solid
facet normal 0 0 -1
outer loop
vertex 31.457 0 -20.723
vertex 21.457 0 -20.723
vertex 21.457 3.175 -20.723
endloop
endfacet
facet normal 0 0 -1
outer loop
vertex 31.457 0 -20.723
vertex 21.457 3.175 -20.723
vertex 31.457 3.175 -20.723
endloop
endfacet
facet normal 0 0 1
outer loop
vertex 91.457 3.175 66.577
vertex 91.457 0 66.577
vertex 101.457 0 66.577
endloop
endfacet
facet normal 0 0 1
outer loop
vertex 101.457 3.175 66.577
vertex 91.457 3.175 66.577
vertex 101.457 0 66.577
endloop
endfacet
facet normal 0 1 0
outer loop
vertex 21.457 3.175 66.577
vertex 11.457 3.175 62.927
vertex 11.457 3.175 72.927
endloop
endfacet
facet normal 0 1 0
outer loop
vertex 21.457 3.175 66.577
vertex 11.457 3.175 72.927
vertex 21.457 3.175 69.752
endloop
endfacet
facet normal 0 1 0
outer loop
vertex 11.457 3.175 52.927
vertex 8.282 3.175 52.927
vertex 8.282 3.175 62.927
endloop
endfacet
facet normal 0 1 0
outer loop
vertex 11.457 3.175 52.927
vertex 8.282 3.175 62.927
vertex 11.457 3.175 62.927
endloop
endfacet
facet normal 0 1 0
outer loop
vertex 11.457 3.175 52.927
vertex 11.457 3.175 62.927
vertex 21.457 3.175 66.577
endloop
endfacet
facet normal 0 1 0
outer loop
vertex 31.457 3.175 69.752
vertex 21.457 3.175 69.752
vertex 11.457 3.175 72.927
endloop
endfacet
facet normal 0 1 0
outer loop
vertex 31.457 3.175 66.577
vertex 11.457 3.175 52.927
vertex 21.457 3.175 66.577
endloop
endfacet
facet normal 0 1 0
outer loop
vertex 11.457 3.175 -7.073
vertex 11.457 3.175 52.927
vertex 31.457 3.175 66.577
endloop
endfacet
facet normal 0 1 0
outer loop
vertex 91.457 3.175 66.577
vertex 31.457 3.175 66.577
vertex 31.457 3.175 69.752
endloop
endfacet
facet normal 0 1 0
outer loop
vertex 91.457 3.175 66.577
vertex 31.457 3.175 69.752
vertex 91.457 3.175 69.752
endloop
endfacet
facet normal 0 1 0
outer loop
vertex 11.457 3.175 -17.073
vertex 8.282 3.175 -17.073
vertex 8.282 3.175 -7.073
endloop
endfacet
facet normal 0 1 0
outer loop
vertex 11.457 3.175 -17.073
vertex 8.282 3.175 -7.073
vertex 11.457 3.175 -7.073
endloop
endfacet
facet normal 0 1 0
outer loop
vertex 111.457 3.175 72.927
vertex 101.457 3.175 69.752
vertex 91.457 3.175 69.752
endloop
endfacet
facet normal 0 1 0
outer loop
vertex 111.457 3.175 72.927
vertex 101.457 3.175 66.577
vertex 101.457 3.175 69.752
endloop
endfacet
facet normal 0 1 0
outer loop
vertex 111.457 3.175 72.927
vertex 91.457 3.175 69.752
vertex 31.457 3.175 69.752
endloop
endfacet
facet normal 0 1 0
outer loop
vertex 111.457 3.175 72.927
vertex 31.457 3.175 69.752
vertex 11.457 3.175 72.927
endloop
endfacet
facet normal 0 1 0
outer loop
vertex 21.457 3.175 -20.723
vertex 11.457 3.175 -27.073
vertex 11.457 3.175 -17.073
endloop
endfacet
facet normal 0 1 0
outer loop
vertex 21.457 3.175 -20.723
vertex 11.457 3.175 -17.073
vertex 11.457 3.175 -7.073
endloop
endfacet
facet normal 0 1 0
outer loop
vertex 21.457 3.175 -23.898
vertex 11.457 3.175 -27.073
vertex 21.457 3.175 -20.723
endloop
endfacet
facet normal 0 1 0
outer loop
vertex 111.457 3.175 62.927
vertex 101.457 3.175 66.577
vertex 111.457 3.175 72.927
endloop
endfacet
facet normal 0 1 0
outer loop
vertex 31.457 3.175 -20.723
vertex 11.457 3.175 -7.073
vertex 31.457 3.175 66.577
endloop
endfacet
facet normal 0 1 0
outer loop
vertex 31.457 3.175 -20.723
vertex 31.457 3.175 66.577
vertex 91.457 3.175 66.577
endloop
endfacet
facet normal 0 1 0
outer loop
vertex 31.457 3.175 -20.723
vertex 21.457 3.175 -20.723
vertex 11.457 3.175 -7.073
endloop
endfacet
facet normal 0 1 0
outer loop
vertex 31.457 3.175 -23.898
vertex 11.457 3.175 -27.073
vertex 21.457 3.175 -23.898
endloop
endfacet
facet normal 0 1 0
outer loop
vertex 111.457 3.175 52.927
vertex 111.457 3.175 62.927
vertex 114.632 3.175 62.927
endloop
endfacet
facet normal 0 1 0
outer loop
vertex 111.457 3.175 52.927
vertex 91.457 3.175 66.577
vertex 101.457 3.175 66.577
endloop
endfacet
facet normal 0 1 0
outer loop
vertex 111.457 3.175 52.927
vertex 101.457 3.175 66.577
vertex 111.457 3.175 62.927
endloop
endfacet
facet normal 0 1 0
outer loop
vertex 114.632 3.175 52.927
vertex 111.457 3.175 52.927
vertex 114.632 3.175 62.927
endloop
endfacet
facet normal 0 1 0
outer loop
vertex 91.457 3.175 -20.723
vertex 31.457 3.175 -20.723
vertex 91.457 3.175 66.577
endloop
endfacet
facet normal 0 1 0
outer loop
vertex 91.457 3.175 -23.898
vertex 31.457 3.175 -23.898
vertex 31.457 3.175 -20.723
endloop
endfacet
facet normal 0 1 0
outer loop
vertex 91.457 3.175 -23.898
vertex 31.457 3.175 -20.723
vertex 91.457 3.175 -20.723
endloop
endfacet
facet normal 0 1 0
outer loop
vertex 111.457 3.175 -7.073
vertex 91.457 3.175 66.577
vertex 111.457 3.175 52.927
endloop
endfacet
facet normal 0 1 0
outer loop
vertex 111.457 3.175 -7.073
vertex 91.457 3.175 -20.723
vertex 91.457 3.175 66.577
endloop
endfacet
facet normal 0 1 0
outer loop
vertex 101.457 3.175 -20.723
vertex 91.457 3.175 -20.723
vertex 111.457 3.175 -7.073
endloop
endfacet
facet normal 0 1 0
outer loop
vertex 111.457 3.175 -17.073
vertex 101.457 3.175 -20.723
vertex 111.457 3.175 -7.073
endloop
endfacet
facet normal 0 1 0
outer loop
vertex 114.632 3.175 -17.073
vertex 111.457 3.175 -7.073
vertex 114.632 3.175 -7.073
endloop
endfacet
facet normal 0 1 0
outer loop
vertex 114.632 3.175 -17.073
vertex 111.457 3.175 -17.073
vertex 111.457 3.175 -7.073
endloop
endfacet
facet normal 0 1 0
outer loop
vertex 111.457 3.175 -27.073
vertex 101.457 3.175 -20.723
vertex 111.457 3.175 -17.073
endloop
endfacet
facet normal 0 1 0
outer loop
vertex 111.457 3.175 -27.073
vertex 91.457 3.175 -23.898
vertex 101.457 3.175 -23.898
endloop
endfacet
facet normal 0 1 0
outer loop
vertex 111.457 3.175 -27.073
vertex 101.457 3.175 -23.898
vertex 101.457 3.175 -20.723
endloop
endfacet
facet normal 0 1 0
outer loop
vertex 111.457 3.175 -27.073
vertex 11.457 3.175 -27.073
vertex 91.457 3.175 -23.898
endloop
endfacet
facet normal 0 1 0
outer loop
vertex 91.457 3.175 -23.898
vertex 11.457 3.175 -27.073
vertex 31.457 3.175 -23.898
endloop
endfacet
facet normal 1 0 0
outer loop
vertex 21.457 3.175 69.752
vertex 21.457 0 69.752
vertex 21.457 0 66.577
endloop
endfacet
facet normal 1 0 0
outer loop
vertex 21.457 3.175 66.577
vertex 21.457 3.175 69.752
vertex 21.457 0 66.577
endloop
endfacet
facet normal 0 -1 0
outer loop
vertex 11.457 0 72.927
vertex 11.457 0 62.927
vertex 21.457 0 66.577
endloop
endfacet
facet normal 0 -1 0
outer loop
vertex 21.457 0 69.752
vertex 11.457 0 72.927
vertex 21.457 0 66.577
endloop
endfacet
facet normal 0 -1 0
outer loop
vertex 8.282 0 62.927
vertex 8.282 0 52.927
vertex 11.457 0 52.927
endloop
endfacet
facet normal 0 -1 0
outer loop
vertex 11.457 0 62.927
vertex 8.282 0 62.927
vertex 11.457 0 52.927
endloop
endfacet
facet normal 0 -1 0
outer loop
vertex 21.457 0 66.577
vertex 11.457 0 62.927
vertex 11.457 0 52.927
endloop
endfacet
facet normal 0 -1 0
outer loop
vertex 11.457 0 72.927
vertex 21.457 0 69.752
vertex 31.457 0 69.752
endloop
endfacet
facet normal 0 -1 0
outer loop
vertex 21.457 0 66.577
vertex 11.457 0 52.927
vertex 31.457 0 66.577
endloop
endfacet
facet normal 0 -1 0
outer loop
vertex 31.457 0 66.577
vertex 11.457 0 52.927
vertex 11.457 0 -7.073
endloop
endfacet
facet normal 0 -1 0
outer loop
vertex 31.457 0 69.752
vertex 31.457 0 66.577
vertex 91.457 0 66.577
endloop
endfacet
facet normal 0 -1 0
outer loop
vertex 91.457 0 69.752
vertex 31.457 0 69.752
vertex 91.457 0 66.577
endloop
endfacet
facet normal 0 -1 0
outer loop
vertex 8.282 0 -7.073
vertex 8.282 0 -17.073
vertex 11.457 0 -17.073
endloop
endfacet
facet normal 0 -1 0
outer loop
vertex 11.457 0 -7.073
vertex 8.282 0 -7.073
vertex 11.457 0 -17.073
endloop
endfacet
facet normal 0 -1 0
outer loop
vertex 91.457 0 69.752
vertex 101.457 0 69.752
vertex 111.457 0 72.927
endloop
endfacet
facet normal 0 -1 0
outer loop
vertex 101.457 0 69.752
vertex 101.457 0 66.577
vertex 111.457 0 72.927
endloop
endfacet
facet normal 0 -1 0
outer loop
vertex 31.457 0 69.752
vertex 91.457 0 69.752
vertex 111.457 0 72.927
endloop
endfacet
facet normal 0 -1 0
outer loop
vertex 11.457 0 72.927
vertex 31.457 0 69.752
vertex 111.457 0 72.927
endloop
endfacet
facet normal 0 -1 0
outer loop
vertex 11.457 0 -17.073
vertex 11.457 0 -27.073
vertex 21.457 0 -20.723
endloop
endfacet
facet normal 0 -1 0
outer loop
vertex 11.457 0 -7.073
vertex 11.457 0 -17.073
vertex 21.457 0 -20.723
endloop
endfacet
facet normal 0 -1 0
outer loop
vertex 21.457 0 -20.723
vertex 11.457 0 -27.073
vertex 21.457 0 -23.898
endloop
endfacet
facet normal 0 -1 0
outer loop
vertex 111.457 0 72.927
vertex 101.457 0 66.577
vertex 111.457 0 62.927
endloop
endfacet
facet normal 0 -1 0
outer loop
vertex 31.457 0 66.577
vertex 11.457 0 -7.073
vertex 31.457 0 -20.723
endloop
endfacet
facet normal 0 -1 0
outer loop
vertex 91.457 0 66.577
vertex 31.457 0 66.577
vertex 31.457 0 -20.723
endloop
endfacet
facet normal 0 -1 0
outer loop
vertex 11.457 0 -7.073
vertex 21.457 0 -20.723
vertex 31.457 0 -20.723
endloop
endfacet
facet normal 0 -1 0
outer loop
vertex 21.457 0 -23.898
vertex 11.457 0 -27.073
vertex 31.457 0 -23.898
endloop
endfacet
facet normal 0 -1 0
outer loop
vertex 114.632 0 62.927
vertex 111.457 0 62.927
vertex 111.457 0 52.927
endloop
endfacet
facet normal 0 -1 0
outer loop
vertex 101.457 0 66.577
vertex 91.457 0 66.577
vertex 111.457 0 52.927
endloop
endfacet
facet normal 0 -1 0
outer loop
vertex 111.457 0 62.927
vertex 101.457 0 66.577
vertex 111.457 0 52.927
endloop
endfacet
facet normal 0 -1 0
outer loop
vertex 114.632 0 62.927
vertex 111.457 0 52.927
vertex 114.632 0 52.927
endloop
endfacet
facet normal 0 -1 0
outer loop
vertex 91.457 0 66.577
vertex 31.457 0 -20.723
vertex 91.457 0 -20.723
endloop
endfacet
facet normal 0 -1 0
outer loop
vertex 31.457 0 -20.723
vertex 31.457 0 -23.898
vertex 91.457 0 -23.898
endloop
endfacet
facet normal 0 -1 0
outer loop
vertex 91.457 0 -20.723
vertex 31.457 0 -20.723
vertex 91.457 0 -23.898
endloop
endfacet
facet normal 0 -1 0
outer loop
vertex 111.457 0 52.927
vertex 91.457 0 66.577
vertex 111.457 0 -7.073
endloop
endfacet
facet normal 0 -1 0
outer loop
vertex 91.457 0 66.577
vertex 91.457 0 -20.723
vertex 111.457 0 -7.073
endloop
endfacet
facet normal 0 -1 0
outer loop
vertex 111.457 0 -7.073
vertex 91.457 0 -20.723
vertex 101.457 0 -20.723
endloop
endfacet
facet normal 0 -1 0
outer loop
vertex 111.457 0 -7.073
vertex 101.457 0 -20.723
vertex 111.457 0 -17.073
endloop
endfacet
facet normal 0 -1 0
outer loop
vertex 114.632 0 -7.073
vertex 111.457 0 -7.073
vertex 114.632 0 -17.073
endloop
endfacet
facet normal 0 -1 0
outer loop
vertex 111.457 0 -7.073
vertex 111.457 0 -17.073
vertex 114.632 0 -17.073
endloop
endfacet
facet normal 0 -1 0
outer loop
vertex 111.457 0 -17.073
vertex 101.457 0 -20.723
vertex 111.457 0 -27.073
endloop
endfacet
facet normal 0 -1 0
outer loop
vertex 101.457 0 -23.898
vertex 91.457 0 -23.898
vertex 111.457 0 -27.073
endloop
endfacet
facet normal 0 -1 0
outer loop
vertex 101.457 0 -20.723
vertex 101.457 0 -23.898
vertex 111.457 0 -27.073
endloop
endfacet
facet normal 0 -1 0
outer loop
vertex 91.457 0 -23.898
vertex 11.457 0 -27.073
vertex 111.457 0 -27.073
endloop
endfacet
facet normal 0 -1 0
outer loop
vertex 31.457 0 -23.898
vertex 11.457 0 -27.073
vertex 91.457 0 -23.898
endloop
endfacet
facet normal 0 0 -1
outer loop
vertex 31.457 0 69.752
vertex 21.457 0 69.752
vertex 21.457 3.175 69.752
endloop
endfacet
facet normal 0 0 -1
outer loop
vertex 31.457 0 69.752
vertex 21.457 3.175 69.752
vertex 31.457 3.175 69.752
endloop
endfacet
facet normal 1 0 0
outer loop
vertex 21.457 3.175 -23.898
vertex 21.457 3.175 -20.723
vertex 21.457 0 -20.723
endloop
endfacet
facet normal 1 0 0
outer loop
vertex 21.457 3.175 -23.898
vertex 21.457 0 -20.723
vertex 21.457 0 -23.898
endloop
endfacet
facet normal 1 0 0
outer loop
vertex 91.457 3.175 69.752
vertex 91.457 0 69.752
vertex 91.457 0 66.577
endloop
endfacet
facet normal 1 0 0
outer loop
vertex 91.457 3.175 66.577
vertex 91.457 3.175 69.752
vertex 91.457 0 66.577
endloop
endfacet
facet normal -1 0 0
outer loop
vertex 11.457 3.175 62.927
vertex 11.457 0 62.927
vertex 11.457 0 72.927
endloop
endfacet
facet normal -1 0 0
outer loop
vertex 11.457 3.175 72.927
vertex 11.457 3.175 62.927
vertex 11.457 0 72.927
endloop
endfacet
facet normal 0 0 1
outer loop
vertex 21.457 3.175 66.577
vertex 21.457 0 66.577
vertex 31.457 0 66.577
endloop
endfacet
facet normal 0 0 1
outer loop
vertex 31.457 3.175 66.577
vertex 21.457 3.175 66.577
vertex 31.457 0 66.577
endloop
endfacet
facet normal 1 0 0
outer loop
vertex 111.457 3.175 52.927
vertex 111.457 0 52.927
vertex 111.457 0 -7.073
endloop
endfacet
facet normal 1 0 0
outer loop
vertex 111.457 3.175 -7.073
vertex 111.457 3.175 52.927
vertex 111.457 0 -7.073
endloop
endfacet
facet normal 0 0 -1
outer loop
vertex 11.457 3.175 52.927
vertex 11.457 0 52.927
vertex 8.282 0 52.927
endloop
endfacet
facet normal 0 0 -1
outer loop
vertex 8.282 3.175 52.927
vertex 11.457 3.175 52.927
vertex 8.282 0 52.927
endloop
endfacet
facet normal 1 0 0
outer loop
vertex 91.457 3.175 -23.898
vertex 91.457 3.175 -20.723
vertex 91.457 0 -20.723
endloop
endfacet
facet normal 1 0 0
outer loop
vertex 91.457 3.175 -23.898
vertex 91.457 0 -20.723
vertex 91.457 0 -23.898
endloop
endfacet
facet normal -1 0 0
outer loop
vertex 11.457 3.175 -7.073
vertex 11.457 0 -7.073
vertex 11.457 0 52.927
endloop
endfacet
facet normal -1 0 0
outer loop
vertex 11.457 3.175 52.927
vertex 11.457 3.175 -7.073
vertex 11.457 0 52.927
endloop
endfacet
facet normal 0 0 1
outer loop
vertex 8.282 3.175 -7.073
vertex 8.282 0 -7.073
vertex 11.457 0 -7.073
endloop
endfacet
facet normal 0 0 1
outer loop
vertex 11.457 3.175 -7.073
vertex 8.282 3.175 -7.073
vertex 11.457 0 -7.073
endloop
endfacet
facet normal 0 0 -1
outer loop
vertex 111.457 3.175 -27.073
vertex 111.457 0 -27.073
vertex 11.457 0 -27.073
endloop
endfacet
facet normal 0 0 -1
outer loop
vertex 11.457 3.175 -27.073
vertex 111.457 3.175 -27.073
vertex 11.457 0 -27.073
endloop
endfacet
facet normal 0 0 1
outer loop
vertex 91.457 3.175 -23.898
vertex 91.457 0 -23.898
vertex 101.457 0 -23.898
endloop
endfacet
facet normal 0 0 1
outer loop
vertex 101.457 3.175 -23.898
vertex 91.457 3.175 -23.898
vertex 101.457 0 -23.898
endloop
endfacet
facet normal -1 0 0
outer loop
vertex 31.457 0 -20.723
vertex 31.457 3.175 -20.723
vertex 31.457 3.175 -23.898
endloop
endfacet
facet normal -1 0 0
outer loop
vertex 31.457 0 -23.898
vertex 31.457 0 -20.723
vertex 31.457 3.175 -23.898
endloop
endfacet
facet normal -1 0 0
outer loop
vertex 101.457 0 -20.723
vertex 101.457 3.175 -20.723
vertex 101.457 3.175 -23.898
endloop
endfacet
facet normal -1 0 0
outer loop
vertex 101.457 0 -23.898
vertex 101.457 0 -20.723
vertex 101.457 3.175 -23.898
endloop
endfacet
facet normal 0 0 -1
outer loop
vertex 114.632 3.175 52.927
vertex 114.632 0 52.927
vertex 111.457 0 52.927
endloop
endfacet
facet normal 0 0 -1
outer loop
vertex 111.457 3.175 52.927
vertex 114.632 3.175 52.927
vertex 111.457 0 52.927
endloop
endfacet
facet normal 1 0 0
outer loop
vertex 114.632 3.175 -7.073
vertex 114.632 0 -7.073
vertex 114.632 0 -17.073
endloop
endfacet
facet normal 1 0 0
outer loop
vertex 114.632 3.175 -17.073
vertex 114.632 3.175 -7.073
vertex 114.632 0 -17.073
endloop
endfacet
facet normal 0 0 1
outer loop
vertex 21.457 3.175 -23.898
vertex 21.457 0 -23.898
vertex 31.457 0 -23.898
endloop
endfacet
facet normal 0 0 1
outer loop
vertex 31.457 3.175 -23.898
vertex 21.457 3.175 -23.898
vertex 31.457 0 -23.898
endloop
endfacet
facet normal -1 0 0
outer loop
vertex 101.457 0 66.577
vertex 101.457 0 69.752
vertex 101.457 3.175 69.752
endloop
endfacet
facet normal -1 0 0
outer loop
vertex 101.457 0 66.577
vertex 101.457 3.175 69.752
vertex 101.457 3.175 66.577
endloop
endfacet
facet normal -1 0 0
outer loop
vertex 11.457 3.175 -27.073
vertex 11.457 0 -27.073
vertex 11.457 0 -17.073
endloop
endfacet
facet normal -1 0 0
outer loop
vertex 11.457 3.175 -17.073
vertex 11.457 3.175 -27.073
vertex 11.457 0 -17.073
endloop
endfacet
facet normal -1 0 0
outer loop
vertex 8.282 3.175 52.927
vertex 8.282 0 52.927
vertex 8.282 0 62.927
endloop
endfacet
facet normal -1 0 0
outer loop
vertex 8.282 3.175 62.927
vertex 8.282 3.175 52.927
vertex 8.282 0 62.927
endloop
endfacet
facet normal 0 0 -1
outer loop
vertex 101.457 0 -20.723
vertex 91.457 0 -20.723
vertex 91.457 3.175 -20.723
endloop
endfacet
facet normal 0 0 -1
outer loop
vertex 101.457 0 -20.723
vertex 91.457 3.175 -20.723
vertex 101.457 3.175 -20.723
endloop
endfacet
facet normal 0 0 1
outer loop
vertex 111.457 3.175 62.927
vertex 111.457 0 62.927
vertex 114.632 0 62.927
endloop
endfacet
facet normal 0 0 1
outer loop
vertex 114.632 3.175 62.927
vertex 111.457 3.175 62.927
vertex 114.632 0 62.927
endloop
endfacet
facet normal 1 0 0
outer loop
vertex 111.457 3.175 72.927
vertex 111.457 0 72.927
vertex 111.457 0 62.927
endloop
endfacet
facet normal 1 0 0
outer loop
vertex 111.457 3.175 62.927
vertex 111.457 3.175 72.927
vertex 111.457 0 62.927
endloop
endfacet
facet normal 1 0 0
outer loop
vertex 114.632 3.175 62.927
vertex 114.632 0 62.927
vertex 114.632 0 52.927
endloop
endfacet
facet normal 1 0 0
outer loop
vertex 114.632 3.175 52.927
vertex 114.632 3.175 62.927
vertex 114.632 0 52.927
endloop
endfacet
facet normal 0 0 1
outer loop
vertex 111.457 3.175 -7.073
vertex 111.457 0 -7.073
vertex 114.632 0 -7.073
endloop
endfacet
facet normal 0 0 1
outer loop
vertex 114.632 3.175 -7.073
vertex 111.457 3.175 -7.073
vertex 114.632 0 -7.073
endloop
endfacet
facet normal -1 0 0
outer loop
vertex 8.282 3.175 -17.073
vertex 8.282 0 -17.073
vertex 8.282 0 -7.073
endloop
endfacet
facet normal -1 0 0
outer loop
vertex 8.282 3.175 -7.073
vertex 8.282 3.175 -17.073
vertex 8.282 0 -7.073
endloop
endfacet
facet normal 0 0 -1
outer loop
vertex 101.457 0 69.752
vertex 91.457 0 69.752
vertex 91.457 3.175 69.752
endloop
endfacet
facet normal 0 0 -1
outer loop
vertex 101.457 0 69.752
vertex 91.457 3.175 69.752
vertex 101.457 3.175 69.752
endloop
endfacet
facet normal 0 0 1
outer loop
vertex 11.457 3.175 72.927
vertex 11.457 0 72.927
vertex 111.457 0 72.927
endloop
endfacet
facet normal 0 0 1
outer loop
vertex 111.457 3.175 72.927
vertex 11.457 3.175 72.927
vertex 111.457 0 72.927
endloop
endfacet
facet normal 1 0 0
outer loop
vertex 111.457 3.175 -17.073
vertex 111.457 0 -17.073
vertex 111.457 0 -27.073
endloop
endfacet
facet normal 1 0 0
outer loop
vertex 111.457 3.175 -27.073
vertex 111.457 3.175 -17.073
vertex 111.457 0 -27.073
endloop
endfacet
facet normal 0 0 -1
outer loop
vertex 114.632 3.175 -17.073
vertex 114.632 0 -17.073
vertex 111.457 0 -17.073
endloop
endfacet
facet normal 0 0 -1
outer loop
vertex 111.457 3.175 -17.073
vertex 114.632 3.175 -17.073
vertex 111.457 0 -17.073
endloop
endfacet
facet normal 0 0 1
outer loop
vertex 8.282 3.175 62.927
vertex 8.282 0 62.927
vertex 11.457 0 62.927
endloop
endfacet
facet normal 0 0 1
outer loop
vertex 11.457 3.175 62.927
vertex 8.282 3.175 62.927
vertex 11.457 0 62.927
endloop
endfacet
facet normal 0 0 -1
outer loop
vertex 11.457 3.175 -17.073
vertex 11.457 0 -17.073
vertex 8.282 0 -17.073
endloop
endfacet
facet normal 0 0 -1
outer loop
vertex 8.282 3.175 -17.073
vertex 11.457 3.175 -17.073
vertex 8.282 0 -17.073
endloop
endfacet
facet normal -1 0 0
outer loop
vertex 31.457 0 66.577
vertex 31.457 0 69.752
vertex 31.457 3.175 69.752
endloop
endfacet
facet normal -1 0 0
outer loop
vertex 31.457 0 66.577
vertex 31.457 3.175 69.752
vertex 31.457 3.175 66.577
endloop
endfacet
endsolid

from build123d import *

# Parameters (mm, degrees)
SKETCH2_W           = 10
SKETCH2_H           = 3.175
BOSS_EXTRUDE1_DEPTH = 3.175


with BuildPart() as part:
    # Sketch2 → Boss-Extrude1 (new body)
    with BuildSketch(Plane(origin=(0, 0, 0), x_dir=(1, 0, 0), z_dir=(0, 1, 0))):
        Polygon((11.456556246, -72.927322323), (111.456556246, -72.927322323), (111.456556246, -62.927322323), (114.631556246, -62.927322323), (114.631556246, -52.927322323), (111.456556246, -52.927322323), (111.456556246, 7.072677677), (114.631556246, 7.072677677), (114.631556246, 17.072677677), (111.456556246, 17.072677677), (111.456556246, 27.072677677), (11.456556246, 27.072677677), (11.456556246, 17.072677677), (8.281556246, 17.072677677), (8.281556246, 7.072677677), (11.456556246, 7.072677677), (11.456556246, -52.927322323), (8.281556246, -52.927322323), (8.281556246, -62.927322323), (11.456556246, -62.927322323), align=None)
        with Locations((26.456556246, 22.310177677)):
            Rectangle(SKETCH2_W, SKETCH2_H, mode=Mode.SUBTRACT)
        with Locations((96.456556246, 22.310177677)):
            Rectangle(SKETCH2_W, SKETCH2_H, mode=Mode.SUBTRACT)
        with Locations((96.456556246, -68.164822323)):
            Rectangle(SKETCH2_W, SKETCH2_H, mode=Mode.SUBTRACT)
        with Locations((26.456556246, -68.164822323)):
            Rectangle(SKETCH2_W, SKETCH2_H, mode=Mode.SUBTRACT)
    extrude(amount=BOSS_EXTRUDE1_DEPTH)


solid = part.part
